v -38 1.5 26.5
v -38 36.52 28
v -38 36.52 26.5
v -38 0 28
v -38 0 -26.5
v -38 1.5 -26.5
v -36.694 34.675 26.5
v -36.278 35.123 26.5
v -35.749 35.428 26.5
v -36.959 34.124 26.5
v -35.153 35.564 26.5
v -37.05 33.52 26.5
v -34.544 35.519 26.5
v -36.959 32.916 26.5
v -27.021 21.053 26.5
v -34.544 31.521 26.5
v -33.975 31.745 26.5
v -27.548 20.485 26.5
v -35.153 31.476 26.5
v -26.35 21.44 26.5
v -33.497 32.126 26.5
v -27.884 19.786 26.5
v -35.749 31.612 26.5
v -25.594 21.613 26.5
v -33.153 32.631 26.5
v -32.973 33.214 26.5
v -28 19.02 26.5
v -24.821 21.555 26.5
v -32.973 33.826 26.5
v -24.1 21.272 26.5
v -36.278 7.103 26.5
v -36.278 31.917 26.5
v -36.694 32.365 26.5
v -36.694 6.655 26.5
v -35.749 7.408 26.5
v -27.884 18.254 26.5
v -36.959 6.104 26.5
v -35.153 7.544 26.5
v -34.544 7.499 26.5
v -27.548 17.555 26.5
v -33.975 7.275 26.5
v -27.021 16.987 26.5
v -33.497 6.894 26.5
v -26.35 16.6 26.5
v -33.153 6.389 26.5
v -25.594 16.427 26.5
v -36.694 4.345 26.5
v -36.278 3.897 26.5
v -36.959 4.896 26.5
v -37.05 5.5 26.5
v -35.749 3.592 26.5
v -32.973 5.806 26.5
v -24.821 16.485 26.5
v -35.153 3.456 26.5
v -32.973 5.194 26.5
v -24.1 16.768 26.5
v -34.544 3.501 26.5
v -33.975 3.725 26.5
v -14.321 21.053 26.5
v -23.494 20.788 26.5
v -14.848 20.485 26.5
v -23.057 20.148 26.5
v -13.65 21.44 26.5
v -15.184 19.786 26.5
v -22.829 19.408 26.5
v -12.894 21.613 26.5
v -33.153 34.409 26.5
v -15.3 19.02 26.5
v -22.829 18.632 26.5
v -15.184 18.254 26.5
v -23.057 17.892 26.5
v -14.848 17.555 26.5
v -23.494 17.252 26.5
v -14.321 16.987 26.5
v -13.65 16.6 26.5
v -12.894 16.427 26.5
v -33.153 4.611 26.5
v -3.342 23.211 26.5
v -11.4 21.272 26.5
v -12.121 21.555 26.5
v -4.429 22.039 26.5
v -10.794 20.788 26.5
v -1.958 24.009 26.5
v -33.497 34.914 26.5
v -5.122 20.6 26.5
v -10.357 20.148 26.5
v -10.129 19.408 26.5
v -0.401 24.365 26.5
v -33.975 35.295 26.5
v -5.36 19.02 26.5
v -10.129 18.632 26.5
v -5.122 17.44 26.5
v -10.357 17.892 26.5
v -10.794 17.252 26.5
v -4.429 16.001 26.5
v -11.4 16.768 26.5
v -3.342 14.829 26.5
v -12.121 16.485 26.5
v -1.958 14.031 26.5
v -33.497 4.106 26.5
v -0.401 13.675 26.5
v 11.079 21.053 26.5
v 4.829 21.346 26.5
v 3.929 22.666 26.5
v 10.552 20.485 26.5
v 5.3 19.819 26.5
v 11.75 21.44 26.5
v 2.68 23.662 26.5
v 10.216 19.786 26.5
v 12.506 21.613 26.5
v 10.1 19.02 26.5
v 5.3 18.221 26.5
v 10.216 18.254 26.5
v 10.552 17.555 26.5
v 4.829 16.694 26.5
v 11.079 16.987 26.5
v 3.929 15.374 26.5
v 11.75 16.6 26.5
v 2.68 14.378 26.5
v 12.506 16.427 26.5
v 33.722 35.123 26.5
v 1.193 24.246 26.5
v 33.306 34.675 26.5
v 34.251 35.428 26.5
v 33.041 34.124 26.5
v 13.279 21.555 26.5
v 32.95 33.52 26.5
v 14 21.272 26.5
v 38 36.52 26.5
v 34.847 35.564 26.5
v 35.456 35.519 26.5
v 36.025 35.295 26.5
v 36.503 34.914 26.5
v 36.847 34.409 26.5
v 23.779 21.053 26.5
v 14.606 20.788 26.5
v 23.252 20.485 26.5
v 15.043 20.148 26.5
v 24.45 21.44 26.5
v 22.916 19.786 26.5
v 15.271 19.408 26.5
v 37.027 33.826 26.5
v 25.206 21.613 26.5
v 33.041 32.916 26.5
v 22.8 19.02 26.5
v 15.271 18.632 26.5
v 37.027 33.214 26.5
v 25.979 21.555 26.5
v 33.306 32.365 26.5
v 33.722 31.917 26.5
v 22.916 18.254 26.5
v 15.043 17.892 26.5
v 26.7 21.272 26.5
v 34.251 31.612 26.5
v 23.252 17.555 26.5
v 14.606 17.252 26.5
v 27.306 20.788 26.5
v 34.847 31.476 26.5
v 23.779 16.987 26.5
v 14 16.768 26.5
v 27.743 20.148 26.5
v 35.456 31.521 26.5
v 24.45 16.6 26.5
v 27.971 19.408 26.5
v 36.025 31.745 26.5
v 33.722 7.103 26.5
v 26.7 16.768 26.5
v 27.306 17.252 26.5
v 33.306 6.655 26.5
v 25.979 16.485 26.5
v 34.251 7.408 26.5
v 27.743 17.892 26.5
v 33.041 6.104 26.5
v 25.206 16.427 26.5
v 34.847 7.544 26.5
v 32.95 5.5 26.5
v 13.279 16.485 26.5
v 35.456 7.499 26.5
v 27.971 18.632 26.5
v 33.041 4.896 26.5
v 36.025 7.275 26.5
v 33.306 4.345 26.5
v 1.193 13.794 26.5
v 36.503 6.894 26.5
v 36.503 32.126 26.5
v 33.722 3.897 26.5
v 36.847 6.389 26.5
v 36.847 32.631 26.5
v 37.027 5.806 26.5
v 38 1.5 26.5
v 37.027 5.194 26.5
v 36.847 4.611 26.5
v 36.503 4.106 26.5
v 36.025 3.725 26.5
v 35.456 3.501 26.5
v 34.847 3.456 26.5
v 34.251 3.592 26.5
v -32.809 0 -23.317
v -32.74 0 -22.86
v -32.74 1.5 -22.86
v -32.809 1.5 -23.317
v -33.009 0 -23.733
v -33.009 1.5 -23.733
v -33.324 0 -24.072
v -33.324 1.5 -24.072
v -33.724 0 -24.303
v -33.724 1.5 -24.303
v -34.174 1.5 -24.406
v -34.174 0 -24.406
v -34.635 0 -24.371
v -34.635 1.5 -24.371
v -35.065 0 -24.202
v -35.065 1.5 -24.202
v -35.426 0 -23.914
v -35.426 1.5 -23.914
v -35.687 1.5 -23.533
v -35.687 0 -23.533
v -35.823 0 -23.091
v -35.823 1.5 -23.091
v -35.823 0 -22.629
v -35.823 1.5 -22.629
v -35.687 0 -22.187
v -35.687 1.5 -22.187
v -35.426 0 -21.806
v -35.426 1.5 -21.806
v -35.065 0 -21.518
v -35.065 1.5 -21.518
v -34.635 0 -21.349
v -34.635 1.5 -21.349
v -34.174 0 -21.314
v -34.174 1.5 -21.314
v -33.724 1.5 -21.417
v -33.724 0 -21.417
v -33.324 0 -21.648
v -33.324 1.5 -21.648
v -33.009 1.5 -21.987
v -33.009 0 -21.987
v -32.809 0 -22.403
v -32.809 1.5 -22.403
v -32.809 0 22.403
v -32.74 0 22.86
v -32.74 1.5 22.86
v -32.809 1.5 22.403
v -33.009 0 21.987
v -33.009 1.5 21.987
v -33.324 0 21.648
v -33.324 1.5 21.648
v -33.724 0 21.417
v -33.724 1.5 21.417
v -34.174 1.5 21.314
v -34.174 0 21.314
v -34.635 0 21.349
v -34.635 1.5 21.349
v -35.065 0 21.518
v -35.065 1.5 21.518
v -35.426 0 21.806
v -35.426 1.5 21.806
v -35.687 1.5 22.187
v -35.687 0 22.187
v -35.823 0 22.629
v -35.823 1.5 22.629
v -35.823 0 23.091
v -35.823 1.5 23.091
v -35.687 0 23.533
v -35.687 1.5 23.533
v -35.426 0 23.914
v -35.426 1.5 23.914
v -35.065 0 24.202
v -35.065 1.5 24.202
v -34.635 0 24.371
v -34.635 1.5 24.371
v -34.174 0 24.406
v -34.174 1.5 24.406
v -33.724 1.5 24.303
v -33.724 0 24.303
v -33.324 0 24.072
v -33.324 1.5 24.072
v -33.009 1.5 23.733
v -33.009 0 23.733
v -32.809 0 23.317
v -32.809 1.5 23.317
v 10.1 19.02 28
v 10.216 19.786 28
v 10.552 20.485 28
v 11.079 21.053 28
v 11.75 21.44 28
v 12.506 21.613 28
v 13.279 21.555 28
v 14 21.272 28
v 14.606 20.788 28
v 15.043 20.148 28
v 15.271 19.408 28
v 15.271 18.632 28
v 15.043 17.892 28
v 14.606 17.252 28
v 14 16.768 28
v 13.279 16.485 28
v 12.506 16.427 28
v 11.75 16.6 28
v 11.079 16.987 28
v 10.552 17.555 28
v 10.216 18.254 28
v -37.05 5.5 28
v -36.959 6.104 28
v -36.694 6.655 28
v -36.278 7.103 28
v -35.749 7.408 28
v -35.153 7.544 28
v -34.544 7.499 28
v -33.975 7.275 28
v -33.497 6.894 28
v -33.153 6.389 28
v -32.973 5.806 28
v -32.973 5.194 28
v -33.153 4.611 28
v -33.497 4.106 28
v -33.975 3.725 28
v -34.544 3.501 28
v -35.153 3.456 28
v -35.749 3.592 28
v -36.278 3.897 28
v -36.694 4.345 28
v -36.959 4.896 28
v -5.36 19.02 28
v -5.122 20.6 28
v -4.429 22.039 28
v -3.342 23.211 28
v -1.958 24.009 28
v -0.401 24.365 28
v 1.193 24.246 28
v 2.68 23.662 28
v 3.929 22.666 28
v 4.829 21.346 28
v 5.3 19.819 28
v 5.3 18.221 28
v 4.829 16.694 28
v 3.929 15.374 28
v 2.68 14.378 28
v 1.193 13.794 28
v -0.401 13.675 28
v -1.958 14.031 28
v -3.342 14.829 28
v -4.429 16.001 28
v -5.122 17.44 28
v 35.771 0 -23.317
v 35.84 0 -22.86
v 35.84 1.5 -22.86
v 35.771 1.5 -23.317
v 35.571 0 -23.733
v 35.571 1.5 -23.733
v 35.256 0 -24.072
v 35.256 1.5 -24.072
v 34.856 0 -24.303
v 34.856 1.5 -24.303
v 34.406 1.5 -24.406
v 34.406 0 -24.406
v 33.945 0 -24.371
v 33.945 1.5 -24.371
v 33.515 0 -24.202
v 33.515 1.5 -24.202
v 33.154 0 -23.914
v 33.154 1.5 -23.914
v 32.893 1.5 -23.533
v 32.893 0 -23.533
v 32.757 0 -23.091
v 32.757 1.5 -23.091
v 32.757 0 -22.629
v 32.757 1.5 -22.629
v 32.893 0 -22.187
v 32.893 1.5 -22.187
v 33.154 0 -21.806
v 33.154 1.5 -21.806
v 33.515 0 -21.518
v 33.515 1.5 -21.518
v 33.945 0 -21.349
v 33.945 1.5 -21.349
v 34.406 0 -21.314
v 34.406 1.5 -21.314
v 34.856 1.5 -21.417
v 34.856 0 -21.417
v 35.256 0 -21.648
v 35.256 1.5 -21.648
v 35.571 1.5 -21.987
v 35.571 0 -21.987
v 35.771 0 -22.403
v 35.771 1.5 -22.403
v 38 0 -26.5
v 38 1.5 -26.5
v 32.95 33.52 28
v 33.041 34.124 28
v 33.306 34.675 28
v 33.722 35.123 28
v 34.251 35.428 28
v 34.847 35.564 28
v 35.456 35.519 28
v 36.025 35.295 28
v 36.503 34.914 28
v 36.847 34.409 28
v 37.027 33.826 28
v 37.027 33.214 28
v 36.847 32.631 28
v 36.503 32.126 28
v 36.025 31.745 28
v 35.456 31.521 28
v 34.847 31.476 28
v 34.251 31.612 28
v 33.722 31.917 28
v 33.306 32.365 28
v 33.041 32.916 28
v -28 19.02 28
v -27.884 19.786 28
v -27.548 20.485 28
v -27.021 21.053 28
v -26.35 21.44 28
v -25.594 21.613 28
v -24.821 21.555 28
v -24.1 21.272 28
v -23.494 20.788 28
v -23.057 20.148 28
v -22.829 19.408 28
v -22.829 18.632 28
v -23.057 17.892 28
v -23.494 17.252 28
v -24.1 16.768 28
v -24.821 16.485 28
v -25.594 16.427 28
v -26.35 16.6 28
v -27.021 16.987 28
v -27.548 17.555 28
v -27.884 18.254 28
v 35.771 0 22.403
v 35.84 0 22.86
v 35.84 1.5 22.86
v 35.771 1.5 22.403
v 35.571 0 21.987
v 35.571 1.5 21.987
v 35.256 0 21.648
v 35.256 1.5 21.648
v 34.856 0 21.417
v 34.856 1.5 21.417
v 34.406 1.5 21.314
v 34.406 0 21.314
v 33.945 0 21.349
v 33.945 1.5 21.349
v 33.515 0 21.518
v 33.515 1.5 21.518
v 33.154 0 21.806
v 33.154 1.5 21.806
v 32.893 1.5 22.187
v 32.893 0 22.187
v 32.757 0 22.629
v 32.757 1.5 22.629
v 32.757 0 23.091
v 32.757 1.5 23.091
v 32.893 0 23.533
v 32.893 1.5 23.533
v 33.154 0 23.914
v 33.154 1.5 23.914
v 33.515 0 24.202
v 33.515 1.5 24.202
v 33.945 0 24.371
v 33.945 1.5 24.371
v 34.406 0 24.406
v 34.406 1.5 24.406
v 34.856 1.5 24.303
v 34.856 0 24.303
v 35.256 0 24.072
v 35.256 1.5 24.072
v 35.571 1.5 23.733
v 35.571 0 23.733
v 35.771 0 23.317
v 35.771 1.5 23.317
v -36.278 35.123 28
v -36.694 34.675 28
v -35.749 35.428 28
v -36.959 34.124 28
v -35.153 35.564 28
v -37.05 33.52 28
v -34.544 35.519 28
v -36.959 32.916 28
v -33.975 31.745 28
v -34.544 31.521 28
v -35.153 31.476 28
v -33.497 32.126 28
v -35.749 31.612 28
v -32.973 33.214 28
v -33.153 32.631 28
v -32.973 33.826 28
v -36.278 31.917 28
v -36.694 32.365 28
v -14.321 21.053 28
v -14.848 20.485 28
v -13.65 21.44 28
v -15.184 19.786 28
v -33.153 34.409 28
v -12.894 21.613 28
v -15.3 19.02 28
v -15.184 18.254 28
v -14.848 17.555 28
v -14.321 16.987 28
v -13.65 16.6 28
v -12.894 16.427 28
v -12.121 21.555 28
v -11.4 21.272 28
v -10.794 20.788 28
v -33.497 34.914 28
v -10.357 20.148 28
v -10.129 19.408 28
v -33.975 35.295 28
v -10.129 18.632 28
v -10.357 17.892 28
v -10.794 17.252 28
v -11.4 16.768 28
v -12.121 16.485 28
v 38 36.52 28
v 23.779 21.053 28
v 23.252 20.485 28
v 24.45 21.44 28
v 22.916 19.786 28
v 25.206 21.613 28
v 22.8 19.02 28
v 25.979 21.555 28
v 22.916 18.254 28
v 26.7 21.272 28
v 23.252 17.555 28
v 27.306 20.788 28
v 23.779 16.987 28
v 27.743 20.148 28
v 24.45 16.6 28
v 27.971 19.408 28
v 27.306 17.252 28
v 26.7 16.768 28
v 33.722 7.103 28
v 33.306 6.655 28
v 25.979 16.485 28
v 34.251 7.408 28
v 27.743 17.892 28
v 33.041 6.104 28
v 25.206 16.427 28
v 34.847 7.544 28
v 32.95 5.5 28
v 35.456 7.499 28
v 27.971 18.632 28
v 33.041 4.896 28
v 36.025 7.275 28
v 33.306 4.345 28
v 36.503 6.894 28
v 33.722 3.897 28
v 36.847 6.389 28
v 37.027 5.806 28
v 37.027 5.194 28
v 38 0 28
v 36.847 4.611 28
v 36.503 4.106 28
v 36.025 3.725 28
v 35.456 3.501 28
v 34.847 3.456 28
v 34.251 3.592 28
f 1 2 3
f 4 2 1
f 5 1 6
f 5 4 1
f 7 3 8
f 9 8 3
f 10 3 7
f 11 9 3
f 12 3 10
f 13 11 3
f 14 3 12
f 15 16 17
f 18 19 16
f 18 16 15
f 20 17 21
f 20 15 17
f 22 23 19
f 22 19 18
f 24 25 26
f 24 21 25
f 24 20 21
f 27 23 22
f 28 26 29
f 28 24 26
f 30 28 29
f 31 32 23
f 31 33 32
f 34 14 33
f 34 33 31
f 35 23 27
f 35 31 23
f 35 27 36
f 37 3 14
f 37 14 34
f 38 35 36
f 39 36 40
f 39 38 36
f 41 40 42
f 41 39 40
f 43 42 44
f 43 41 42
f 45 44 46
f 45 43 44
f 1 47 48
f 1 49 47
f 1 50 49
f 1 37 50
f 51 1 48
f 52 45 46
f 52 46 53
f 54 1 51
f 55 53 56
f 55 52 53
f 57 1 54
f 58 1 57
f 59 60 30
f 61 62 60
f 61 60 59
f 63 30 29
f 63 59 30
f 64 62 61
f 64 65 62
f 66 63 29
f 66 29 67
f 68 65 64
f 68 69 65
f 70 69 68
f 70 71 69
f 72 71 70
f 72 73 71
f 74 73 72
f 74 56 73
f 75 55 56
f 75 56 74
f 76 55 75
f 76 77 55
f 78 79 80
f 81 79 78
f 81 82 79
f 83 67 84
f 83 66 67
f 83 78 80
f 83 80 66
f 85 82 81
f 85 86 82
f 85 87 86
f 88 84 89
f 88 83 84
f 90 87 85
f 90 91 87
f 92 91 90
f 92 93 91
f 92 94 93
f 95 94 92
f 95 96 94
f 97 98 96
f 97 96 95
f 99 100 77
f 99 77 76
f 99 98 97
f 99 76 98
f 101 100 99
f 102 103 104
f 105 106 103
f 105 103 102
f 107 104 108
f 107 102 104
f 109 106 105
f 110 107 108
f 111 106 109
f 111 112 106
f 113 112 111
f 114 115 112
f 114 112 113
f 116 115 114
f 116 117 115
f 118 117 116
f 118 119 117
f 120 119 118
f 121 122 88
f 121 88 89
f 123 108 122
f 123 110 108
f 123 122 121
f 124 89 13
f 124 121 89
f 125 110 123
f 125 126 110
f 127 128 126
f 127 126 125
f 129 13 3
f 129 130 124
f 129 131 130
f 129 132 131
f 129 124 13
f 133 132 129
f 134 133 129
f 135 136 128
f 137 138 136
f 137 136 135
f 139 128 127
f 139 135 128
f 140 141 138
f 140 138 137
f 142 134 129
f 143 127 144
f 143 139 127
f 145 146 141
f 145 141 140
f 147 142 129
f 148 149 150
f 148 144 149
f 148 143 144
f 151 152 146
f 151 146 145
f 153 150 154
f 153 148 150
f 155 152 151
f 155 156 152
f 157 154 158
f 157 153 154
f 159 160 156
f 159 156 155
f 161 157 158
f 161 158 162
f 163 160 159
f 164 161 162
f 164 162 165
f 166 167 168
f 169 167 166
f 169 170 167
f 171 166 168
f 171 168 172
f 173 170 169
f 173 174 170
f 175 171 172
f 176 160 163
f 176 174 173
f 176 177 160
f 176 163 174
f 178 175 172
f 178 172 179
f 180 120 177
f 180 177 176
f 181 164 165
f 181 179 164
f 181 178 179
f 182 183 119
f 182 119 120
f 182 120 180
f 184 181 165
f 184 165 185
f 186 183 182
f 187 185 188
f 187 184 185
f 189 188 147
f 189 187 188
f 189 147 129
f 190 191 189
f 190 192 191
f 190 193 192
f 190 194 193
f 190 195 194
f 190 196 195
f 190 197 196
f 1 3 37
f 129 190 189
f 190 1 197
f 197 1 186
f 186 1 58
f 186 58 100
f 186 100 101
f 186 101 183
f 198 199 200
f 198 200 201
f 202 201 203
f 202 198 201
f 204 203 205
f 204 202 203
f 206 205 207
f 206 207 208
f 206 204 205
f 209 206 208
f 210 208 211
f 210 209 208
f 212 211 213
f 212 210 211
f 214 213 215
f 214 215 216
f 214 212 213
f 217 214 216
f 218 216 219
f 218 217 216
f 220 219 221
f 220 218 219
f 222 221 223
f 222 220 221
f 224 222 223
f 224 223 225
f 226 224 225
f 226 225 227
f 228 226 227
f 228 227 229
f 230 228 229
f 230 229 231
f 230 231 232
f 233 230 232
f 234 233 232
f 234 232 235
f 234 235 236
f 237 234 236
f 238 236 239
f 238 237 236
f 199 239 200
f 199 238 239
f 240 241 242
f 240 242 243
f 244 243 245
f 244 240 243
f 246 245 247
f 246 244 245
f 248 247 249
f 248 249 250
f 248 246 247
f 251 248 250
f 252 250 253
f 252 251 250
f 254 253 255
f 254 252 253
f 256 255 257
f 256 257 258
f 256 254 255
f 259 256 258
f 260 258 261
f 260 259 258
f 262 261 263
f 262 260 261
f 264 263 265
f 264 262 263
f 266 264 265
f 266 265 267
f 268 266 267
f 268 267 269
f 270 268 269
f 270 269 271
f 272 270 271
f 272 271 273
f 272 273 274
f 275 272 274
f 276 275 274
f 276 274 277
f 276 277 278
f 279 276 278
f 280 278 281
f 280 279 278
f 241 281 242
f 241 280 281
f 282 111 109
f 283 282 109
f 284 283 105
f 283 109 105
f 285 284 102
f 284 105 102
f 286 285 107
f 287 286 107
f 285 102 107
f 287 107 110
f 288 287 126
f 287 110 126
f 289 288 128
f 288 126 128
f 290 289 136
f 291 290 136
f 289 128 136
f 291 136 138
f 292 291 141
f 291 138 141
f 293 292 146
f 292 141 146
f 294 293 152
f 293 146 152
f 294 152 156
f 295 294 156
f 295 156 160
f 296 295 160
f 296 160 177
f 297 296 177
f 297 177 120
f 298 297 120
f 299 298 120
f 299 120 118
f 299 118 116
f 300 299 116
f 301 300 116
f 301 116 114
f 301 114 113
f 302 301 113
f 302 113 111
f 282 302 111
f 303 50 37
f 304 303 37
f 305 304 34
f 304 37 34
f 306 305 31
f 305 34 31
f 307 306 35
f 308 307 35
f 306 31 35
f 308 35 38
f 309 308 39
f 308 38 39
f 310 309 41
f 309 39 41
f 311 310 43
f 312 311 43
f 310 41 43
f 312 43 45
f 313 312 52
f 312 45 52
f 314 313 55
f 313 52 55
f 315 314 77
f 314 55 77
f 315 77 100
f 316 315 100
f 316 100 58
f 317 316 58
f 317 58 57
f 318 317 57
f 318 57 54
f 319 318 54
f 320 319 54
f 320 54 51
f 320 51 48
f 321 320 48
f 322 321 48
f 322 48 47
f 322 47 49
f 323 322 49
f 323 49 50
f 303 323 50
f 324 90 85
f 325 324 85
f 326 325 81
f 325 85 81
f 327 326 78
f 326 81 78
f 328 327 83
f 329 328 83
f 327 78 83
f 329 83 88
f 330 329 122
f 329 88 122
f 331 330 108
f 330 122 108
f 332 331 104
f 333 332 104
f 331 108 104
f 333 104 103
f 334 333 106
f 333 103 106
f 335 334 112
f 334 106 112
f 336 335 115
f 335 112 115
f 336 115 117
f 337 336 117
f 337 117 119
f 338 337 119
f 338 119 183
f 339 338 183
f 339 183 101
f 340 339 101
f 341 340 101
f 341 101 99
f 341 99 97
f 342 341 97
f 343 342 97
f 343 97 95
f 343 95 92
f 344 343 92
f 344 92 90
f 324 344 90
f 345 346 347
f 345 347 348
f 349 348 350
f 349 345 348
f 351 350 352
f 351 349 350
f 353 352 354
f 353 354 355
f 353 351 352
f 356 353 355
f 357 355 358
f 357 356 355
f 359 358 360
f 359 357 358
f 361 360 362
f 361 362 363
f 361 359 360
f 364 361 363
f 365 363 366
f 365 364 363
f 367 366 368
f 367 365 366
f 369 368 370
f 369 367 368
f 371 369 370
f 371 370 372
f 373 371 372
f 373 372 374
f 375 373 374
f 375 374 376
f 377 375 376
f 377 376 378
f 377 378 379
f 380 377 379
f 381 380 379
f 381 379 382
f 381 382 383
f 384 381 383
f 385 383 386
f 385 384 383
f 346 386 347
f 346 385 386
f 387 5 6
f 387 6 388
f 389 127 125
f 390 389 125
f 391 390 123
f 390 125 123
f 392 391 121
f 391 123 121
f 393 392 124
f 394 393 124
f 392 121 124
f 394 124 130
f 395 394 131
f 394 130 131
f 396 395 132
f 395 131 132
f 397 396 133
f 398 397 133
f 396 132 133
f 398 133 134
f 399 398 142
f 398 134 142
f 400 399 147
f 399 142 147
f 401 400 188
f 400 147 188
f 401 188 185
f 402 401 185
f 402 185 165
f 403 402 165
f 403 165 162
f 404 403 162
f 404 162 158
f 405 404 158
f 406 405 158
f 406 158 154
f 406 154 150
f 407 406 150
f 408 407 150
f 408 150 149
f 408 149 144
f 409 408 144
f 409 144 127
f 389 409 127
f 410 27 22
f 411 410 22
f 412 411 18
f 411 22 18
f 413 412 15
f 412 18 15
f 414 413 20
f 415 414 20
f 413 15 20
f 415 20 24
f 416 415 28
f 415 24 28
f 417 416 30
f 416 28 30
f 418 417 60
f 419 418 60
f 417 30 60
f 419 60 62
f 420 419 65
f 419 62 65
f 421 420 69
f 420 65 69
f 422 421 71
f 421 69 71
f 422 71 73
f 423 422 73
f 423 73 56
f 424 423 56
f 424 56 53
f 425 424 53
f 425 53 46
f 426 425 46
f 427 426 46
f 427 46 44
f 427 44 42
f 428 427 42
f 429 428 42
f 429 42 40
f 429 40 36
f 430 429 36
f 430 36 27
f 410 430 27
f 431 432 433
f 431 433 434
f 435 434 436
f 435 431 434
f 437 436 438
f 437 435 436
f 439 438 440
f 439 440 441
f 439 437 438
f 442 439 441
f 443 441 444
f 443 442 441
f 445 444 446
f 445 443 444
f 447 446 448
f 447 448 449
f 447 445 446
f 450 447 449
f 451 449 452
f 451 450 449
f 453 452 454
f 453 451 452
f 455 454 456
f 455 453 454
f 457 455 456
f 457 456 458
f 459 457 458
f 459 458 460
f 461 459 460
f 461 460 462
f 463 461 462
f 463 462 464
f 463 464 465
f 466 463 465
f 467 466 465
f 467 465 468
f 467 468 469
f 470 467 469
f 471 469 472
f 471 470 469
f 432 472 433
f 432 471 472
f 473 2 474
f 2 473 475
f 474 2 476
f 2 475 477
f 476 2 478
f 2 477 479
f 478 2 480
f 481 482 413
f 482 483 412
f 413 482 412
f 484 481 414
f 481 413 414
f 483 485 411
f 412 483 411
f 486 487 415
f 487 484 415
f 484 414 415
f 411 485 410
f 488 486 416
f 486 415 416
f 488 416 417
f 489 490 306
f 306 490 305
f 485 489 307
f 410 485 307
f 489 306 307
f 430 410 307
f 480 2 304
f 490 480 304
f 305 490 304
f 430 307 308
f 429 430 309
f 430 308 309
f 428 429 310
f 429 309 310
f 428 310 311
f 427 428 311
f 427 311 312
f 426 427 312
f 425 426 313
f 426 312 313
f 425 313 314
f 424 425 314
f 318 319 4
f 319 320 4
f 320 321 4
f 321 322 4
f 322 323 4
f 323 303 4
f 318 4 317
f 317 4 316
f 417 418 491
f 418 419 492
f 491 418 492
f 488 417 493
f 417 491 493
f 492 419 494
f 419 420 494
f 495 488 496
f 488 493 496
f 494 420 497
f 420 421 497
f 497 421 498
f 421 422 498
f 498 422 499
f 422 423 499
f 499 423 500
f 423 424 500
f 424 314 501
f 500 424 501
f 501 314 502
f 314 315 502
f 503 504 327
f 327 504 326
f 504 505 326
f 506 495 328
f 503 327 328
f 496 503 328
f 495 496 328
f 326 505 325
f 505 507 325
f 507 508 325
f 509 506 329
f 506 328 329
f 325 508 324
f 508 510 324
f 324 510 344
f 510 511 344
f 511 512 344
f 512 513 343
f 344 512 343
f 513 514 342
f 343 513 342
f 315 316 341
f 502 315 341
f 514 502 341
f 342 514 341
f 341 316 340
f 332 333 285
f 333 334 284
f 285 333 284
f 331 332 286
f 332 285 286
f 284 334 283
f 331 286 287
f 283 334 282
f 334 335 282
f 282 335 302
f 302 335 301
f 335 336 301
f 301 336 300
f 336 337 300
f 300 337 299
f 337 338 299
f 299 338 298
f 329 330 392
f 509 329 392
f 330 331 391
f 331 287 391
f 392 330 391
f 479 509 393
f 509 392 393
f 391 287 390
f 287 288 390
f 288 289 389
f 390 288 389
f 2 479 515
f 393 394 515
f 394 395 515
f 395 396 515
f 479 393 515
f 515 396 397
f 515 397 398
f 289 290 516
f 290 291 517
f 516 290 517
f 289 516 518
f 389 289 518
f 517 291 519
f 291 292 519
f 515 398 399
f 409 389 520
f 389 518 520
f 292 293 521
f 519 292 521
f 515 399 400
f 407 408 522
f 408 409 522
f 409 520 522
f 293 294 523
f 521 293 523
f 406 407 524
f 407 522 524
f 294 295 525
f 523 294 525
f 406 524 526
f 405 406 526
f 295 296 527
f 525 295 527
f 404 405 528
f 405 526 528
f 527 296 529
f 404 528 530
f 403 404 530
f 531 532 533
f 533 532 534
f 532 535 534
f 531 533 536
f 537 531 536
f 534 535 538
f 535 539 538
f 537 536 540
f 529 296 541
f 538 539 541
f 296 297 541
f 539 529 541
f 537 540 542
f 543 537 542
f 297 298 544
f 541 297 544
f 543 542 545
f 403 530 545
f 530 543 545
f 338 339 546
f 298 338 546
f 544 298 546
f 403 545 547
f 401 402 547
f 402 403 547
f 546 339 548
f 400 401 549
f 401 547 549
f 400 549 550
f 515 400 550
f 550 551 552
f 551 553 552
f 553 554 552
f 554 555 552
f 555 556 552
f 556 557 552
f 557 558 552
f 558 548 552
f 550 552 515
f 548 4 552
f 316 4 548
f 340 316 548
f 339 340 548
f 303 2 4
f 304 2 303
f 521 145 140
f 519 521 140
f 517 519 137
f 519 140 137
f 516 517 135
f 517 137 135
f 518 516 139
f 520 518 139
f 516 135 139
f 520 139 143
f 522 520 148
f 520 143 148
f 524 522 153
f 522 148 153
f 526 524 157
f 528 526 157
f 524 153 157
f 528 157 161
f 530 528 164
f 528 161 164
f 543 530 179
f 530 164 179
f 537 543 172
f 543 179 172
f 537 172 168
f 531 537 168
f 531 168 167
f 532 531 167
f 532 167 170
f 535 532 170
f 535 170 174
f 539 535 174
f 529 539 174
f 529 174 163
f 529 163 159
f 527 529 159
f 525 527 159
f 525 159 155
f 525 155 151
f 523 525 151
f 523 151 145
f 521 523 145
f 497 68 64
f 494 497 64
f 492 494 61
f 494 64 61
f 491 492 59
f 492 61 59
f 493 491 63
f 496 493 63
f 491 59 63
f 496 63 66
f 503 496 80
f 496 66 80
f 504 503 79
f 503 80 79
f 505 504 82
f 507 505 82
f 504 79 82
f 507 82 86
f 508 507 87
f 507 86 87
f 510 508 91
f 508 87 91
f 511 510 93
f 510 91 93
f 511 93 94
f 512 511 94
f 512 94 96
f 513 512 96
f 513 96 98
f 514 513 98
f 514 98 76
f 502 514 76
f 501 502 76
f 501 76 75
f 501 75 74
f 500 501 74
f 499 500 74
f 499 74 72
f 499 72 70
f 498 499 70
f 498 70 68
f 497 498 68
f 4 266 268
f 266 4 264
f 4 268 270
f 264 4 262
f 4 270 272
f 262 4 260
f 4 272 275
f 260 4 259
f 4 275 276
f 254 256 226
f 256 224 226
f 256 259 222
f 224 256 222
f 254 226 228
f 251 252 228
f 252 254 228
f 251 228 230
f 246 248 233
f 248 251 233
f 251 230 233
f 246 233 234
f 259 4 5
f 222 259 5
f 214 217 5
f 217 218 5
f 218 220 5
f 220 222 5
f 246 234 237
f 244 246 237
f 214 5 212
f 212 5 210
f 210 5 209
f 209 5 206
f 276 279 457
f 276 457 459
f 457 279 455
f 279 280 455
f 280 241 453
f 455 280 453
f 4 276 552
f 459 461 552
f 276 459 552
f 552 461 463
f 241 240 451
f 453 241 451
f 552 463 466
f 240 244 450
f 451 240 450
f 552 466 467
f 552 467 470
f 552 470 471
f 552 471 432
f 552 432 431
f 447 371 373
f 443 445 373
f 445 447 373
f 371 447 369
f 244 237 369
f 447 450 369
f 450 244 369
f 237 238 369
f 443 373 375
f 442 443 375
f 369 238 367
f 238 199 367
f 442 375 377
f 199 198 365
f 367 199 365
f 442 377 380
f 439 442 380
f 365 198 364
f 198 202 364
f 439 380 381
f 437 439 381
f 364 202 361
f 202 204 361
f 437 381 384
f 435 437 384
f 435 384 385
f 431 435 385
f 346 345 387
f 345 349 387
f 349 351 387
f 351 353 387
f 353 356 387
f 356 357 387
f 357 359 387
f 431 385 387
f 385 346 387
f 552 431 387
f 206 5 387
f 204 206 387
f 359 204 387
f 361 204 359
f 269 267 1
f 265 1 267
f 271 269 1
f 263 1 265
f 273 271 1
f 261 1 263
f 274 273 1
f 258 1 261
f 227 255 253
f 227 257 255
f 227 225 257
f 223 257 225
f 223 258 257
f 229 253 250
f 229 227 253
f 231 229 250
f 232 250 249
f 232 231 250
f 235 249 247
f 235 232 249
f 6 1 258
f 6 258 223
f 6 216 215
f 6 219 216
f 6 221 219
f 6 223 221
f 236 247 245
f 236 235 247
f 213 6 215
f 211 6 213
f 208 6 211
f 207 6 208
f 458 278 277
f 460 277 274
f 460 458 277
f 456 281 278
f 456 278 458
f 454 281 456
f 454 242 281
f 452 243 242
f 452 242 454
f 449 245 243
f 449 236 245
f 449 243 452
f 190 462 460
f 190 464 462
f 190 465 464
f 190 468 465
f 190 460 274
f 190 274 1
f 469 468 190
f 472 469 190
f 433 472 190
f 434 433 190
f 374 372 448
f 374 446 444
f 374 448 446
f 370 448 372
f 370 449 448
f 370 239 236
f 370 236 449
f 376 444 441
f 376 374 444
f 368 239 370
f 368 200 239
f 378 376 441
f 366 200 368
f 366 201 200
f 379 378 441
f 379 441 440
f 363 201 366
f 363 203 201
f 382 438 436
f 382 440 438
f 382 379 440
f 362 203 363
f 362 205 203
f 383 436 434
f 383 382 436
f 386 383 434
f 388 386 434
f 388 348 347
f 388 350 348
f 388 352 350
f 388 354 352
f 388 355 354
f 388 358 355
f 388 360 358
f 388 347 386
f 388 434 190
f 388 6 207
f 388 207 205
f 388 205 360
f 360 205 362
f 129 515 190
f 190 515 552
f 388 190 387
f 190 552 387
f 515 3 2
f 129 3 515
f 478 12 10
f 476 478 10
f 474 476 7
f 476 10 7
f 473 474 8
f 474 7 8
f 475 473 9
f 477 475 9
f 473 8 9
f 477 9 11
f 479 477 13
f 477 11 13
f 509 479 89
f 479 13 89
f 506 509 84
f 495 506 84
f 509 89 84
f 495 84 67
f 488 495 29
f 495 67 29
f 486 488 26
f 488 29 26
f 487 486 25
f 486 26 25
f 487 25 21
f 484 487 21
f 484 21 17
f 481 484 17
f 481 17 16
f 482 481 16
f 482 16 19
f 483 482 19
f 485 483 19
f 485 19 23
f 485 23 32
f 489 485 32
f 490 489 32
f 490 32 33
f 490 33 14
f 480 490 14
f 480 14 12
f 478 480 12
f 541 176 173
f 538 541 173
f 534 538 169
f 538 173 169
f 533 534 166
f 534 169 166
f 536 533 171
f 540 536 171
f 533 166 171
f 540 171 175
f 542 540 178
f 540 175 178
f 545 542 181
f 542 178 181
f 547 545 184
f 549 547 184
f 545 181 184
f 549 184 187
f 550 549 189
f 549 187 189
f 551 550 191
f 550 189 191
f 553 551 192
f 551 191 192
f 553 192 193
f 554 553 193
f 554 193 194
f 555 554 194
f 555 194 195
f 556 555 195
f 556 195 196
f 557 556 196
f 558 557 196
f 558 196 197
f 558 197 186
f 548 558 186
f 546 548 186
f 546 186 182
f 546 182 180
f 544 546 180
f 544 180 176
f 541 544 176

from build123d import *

# Parameters (mm, degrees)
SKETCH_1_W          = 76
SKETCH_1_H          = 53
SKETCH_1_R          = 1.55
EXTRUDE_1_DEPTH     = 1.5
SKETCH_2_W          = 76
SKETCH_2_H          = 1.5
EXTRUDE_2_DEPTH     = 1.5
SKETCH_3_W          = 76
SKETCH_3_H          = 1.5
EXTRUDE_3_DEPTH     = 35.02
SKETCH_4_R          = 5.36
SKETCH_4_R_2        = 2.600000007
CUT_EXTRUDE_1_DEPTH = 60
SKETCH_5_R          = 2.05
CUT_EXTRUDE_2_DEPTH = 10


with BuildPart() as part:
    # 草图1 → 凸台-拉伸1 (new body)
    with BuildSketch(Plane(origin=(0, 0, 0), x_dir=(1, 0, 0), z_dir=(0, 1, 0))):
        Rectangle(SKETCH_1_W, SKETCH_1_H)
        with Locations((-34.29, 22.86)):
            Circle(SKETCH_1_R, mode=Mode.SUBTRACT)
        with Locations((-34.29, -22.86)):
            Circle(SKETCH_1_R, mode=Mode.SUBTRACT)
        with Locations((34.29, -22.86)):
            Circle(SKETCH_1_R, mode=Mode.SUBTRACT)
        with Locations((34.29, 22.86)):
            Circle(SKETCH_1_R, mode=Mode.SUBTRACT)
    extrude(amount=EXTRUDE_1_DEPTH)

    # 草图2 → 凸台-拉伸2 (add)
    with BuildSketch(Plane.XY.offset(26.5)):
        with Locations((0, 0.75)):
            Rectangle(SKETCH_2_W, SKETCH_2_H)
    extrude(amount=EXTRUDE_2_DEPTH)

    # 草图3 → 凸台-拉伸3 (add)
    with BuildSketch(Plane(origin=(0, 1.5, 0), x_dir=(1, 0, 0), z_dir=(0, 1, 0))):
        with Locations((0, -27.25)):
            Rectangle(SKETCH_3_W, SKETCH_3_H)
    extrude(amount=EXTRUDE_3_DEPTH)

    # 草图4 → 切除-拉伸1 (cut)
    with BuildSketch(Plane(origin=(0, 0, 26.5), x_dir=(-1, 0, 0), z_dir=(0, 0, -1))):
        with Locations((0, 19.02)):
            Circle(SKETCH_4_R)
        with Locations((-12.7, 19.02)):
            Circle(SKETCH_4_R_2)
        with Locations((-25.4, 19.02)):
            Circle(SKETCH_4_R_2)
        with Locations((12.7, 19.02)):
            Circle(SKETCH_4_R_2)
        with Locations((25.4, 19.02)):
            Circle(SKETCH_4_R_2)
    extrude(amount=-CUT_EXTRUDE_1_DEPTH, mode=Mode.SUBTRACT)

    # 草图5 → 切除-拉伸2 (cut)
    with BuildSketch(Plane(origin=(0, 0, 26.5), x_dir=(-1, 0, 0), z_dir=(0, 0, -1))):
        with Locations((-35, 33.52)):
            Circle(SKETCH_5_R)
        with Locations((-35, 5.5)):
            Circle(SKETCH_5_R)
        with Locations((35, 5.5)):
            Circle(SKETCH_5_R)
        with Locations((35, 33.52)):
            Circle(SKETCH_5_R)
    extrude(amount=-CUT_EXTRUDE_2_DEPTH, mode=Mode.SUBTRACT)


solid = part.part
